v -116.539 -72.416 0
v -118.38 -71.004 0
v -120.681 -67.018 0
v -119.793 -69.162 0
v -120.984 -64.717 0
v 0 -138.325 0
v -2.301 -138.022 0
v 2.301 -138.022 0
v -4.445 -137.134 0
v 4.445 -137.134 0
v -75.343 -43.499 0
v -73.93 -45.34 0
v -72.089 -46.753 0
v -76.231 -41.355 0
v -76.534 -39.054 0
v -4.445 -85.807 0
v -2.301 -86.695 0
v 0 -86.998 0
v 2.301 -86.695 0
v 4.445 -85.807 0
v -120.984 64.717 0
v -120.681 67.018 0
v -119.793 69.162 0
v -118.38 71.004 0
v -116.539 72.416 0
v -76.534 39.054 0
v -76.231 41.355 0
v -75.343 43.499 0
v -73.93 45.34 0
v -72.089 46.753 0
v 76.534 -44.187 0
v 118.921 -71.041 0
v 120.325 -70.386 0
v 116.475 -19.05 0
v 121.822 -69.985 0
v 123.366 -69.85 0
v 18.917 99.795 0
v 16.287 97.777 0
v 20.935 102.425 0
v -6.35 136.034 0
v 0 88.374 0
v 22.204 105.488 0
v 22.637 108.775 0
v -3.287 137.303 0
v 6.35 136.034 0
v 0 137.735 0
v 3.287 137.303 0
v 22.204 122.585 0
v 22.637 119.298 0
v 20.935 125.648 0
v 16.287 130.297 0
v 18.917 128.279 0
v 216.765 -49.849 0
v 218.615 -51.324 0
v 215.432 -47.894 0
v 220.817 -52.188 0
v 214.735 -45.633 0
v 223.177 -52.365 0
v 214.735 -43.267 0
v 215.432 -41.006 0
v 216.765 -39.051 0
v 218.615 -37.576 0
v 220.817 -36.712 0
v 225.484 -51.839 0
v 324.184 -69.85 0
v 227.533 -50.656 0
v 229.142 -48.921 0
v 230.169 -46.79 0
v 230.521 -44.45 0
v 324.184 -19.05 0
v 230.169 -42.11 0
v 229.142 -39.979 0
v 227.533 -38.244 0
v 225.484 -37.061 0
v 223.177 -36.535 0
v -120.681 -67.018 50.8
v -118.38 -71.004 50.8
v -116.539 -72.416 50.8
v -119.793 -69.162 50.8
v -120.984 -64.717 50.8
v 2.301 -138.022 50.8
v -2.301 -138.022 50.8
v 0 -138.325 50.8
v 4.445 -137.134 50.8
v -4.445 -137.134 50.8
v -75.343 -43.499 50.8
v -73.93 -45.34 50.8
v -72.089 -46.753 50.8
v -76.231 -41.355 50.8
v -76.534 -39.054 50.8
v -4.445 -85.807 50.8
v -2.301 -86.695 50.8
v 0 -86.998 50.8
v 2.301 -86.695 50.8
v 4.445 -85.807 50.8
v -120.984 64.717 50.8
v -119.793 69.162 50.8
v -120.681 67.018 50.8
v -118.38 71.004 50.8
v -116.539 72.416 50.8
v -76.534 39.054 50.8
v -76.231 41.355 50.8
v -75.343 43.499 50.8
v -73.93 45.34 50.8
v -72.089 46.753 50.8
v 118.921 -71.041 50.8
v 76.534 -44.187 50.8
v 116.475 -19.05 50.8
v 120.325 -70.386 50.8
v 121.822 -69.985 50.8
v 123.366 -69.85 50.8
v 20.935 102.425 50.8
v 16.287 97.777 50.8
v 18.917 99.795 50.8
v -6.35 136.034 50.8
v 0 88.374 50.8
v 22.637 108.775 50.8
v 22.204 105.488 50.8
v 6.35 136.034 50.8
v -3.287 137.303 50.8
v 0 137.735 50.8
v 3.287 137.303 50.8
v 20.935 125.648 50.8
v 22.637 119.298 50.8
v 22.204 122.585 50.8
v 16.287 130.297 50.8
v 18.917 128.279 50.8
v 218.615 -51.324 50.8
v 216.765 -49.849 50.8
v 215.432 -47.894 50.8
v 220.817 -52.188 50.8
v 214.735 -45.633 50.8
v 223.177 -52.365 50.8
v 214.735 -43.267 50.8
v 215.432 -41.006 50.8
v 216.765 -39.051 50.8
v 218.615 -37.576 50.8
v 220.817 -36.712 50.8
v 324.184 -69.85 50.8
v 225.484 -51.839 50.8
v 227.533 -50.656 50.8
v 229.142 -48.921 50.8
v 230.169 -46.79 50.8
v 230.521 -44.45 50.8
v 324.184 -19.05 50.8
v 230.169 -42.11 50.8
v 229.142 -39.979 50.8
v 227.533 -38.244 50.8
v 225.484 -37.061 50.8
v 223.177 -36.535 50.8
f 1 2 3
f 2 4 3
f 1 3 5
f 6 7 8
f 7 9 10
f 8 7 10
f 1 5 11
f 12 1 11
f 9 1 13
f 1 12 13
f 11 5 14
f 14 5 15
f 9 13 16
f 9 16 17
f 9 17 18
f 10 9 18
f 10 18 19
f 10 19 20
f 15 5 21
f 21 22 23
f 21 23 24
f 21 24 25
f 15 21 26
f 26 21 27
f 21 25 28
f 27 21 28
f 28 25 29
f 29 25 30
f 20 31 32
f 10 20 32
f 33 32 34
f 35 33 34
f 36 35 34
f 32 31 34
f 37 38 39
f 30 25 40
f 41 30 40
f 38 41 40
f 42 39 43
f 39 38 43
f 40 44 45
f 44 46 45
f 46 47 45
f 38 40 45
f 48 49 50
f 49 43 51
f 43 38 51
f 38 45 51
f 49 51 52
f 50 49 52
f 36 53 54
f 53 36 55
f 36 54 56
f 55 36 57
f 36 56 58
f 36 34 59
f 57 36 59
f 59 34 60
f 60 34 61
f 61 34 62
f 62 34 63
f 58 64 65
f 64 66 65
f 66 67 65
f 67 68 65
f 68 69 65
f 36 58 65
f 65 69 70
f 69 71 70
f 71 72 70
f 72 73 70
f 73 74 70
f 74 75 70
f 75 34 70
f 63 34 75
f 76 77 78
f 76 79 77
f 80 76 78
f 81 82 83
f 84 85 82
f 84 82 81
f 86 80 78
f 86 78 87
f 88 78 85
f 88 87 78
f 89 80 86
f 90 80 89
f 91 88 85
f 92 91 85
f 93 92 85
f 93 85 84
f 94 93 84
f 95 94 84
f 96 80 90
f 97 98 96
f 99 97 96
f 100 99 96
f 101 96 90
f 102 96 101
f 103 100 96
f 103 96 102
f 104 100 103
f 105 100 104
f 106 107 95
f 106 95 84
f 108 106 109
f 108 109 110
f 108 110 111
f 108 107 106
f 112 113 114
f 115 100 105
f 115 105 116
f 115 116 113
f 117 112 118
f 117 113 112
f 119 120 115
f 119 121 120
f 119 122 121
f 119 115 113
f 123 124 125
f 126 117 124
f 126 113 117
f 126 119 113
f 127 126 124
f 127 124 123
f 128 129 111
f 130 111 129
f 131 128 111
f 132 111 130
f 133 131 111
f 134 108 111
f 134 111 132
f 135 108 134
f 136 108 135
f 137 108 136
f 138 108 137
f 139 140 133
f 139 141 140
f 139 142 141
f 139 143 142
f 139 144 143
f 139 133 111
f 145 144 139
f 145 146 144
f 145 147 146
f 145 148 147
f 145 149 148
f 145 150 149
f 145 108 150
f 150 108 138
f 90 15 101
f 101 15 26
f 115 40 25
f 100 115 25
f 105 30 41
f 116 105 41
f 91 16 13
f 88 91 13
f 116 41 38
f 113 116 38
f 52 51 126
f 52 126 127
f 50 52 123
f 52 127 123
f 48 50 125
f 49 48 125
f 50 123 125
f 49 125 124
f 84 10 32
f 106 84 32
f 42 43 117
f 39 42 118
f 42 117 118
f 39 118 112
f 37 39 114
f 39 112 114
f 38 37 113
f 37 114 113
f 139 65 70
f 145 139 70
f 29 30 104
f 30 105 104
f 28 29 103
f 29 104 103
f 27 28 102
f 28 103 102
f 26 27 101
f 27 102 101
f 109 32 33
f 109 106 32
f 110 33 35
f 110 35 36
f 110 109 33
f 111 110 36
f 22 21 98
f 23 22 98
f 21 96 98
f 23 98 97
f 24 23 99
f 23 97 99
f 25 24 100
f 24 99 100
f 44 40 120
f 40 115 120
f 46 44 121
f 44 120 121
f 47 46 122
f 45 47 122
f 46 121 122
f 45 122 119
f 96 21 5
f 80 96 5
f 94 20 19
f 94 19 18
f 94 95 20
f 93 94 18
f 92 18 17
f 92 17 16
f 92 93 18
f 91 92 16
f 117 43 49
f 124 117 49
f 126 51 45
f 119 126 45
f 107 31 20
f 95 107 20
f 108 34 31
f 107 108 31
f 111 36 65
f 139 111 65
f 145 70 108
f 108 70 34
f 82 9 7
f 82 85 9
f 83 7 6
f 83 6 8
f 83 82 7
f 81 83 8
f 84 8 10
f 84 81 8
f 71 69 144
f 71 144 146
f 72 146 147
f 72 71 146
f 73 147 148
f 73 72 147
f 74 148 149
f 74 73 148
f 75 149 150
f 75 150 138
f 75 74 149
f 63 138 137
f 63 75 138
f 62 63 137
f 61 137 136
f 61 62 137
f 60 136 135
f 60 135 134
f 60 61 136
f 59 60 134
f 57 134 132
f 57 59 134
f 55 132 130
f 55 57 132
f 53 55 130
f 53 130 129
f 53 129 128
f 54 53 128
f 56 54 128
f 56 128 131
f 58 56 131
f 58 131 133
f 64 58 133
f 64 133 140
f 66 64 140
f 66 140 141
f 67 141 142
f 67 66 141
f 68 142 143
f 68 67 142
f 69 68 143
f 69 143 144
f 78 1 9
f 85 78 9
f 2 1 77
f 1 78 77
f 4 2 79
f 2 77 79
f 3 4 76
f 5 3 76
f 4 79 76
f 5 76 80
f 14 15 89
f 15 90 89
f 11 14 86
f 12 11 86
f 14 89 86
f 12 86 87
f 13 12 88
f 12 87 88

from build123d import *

# Parameters (mm, degrees)
F0_R     = 7.9375
F1_DEPTH = 50.8
F2_R     = 8.89
F3_R     = 12.7


with BuildPart() as f1:
    # F0 (on Top) → F1 (new body)
    with BuildSketch(Plane.XY):
        Polygon((-120.983749, -69.85), (0, -139.7), (120.983749, -69.85), (324.183749, -69.85), (324.183749, -19.05), (116.475461, -19.05), (76.533749, -44.186781), (0, -88.373561), (-76.533749, -44.186781), (-76.533749, 44.186781), (0, 88.373561), (22.636533, 101.44277), (22.636533, 126.630791), (0, 139.7), (-120.983749, 69.85), align=None)
        with Locations((222.583749, -44.45)):
            Circle(F0_R, mode=Mode.SUBTRACT)
    extrude(amount=F1_DEPTH)

    # F2
    f2_edges = [f1.edges().sort_by_distance(p)[0] for p in [
        (-120.983749, 69.85, 25.4),
        (-120.983749, -69.85, 25.4),
        (0, -139.7, 25.4),
        (120.983749, -69.85, 25.4),
        (-76.533749, 44.186781, 25.4),
        (-76.533749, -44.186781, 25.4),
        (0, -88.373561, 25.4),
    ]]
    fillet(f2_edges, radius=F2_R)

    # F3
    f3_edges = [f1.edges().sort_by_distance(p)[0] for p in [
        (0, 139.7, 25.4),
        (22.636533, 101.44277, 25.4),
        (22.636533, 126.630791, 25.4),
    ]]
    fillet(f3_edges, radius=F3_R)


solid = f1.part
